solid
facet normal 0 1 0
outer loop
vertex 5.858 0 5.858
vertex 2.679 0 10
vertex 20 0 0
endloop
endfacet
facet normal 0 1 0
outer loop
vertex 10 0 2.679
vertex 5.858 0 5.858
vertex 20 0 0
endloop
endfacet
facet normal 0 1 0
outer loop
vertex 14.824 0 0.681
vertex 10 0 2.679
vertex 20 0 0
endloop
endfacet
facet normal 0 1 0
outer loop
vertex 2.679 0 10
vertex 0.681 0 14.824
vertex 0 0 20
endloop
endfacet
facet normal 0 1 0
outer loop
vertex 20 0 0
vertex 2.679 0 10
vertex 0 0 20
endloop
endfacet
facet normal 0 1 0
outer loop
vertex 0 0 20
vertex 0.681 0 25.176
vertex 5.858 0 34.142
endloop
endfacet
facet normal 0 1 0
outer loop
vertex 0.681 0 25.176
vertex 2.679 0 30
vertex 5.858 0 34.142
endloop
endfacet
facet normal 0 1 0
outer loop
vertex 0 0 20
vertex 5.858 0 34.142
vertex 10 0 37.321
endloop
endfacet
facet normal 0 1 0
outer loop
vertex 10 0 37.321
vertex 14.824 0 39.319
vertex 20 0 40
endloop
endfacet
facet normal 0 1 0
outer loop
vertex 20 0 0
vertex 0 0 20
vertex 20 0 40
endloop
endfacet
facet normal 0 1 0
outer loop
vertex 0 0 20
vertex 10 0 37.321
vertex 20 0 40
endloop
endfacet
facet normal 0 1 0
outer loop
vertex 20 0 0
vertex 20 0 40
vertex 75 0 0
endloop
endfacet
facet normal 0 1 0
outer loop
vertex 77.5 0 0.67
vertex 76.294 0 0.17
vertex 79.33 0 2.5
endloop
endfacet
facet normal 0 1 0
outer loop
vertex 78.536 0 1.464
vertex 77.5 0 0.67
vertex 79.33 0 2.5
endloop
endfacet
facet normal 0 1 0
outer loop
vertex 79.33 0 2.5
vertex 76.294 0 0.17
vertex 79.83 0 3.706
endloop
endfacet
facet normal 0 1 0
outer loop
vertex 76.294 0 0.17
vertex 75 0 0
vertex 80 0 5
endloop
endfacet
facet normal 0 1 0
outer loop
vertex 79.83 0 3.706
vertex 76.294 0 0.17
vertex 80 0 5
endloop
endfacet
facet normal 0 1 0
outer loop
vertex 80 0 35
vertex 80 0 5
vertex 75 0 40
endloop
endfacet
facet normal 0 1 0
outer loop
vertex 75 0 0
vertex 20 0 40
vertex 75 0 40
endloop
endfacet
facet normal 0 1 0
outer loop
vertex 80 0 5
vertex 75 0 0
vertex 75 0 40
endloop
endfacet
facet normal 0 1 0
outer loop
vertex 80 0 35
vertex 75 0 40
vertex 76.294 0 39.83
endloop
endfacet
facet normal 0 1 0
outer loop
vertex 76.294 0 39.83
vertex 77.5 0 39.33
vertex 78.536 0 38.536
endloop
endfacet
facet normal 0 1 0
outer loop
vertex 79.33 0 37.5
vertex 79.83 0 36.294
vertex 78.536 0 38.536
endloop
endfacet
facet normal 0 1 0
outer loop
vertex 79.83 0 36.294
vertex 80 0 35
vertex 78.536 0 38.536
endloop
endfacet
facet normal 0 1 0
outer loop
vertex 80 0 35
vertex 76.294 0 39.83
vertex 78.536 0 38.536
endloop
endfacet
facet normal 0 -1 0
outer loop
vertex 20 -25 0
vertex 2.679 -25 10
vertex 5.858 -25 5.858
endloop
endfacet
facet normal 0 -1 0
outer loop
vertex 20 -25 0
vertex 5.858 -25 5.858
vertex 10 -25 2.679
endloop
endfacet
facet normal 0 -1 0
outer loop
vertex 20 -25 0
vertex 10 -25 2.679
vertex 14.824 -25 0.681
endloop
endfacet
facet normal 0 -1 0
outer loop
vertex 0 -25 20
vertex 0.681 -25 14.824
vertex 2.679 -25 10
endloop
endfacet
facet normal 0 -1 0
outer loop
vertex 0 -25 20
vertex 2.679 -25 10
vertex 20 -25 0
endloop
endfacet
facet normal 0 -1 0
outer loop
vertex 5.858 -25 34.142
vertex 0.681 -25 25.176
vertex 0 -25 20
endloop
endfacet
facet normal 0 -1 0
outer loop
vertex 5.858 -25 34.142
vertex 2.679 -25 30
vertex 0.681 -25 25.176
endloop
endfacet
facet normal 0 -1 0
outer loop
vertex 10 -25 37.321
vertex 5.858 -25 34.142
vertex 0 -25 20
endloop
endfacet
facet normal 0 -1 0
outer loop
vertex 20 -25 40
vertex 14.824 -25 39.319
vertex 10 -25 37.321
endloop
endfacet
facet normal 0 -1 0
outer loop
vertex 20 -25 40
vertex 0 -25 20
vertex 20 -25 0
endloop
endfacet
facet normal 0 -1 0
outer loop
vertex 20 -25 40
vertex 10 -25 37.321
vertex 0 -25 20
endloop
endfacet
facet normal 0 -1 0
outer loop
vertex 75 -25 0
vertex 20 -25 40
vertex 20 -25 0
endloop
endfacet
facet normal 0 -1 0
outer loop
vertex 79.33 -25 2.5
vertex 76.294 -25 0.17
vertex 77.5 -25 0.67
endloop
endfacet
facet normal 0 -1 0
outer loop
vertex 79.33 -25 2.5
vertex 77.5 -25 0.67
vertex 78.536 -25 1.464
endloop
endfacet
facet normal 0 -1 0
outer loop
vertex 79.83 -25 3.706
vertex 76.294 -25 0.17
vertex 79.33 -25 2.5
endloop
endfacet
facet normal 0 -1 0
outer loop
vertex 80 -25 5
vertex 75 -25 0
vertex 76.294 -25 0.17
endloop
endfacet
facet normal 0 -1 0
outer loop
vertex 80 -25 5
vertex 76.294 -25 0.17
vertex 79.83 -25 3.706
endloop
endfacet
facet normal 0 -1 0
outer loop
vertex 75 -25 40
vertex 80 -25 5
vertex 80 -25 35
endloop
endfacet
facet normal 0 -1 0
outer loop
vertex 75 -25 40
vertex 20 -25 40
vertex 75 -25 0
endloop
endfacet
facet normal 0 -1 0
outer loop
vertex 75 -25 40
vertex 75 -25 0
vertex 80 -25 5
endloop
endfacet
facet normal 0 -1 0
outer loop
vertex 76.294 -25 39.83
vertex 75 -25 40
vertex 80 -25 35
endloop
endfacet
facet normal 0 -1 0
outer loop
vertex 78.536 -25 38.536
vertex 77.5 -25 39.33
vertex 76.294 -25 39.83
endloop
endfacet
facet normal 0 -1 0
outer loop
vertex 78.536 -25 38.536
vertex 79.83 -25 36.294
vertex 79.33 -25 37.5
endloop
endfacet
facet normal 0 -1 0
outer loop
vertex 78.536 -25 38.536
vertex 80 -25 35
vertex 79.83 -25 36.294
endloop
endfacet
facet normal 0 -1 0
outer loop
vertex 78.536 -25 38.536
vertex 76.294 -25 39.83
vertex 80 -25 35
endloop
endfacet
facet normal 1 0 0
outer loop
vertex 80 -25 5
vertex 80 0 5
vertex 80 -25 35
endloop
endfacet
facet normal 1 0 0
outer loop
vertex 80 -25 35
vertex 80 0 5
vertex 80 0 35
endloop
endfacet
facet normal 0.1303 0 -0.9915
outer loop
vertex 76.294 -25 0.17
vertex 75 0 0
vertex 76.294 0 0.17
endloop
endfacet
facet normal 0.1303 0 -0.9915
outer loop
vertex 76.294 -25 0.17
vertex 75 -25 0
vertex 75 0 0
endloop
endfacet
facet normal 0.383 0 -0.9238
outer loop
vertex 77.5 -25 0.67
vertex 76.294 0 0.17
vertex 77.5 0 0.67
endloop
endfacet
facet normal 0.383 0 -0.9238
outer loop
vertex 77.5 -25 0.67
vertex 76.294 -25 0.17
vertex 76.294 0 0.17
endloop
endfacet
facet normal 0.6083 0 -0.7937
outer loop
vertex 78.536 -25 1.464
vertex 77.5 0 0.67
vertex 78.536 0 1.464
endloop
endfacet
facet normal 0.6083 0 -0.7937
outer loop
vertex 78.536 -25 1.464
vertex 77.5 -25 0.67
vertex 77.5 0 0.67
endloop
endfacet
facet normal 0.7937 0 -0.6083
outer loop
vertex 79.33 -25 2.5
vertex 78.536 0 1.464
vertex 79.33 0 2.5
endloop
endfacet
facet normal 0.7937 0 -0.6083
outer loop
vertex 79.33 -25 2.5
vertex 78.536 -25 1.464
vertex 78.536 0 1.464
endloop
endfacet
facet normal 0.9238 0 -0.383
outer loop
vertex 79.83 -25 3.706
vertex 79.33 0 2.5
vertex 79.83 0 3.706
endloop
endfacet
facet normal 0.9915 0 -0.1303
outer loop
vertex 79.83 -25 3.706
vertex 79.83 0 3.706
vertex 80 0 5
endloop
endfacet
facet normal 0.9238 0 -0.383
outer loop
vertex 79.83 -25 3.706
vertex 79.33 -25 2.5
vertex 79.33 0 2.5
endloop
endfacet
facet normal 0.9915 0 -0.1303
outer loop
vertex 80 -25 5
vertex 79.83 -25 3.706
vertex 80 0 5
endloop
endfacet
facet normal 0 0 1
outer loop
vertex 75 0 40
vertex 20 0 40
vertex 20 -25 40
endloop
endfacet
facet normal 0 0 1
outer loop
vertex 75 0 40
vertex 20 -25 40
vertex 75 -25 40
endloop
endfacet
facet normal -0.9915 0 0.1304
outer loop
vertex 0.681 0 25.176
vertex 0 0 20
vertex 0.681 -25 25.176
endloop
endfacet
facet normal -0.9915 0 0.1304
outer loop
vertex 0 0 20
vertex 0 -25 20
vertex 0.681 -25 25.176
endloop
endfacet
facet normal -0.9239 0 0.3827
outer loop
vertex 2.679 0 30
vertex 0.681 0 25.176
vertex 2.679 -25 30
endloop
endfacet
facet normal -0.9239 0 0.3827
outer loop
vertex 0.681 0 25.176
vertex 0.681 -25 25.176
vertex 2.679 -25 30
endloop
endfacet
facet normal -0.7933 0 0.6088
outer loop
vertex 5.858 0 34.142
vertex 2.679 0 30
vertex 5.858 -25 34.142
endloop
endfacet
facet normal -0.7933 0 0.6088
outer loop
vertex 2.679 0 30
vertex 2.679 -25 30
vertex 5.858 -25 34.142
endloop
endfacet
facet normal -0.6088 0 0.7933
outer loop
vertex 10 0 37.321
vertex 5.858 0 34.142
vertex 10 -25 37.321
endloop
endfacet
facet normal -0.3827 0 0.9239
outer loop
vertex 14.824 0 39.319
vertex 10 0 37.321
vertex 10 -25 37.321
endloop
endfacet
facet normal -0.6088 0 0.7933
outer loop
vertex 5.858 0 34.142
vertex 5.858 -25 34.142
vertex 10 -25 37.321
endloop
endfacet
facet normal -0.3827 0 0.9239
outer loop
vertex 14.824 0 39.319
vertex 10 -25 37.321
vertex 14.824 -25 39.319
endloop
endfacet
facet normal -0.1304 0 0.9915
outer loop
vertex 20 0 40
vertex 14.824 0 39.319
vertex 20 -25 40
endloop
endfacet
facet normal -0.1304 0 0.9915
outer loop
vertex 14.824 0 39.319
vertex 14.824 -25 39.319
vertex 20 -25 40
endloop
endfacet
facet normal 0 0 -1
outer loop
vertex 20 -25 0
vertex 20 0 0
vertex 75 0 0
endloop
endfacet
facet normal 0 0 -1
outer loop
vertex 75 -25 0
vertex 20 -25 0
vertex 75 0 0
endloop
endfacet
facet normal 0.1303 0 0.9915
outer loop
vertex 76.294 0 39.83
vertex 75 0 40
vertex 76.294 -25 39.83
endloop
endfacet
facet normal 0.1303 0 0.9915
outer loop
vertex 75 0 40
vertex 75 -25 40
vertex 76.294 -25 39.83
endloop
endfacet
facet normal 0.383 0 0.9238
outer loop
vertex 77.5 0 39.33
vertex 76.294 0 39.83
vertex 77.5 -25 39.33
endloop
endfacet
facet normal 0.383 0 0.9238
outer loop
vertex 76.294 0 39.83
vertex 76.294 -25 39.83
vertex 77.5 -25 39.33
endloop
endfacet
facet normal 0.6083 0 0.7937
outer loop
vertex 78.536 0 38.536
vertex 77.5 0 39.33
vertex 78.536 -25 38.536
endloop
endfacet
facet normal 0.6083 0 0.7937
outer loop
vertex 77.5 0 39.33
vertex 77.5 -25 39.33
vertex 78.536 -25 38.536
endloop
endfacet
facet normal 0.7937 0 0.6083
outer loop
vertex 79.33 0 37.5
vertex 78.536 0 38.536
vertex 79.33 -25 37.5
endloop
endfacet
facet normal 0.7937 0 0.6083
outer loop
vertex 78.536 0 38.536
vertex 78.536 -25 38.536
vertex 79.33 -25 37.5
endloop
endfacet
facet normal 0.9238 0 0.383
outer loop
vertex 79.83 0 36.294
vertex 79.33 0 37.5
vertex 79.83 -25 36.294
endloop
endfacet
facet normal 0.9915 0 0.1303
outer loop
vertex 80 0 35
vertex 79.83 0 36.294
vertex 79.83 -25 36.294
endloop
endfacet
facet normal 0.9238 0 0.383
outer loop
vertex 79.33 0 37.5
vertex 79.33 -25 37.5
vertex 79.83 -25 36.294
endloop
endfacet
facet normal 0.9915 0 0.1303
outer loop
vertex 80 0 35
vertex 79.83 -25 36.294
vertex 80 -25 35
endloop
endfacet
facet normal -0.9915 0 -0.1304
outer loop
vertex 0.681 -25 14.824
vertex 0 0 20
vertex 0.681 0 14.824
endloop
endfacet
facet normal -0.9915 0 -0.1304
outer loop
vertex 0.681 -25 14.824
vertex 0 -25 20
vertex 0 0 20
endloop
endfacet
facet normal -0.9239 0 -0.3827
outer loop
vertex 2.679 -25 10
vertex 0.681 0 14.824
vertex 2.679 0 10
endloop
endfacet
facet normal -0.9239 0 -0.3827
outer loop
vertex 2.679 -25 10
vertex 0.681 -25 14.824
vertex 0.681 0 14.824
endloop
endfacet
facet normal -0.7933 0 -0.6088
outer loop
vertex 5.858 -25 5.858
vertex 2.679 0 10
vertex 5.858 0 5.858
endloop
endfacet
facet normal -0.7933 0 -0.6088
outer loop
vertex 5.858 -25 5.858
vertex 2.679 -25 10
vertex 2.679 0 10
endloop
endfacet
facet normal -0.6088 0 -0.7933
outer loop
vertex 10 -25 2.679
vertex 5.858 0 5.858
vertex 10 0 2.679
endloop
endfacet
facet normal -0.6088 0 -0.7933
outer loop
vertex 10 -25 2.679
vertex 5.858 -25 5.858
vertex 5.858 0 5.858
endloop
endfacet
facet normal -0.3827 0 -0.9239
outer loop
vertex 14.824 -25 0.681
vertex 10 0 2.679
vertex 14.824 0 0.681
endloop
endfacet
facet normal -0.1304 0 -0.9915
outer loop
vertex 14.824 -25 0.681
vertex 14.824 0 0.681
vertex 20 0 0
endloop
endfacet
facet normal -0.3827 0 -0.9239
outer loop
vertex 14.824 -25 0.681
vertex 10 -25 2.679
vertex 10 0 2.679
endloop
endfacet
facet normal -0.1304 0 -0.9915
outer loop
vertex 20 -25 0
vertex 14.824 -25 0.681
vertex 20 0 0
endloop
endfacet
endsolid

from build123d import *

# Parameters (mm, degrees)
F0_W     = 80
F0_H     = 40
F1_DEPTH = 25
F2_R     = 20
F3_R     = 19.99999
F4_R     = 5


# Not quite as in the source:
# - a fillet or chamfer is up to 0.001 mm smaller than in the source, because OpenCascade refuses the exact size


with BuildPart() as f1:
    # F0 (on Front) → F1 (new body)
    with BuildSketch(Plane.XZ):
        with Locations((40, 20)):
            Rectangle(F0_W, F0_H)
    extrude(amount=F1_DEPTH)

    # F2
    f2_edges = [f1.edges().sort_by_distance(p)[0] for p in [
        (0, -12.5, 40),
    ]]
    fillet(f2_edges, radius=F2_R)

    # F3 (radius 20 in the source; OpenCascade refuses exactly that, so slightly less here)
    f3_edges = [f1.edges().sort_by_distance(p)[0] for p in [
        (0, -12.5, 0),
    ]]
    fillet(f3_edges, radius=F3_R)

    # F4
    f4_edges = [f1.edges().sort_by_distance(p)[0] for p in [
        (80, -12.5, 40),
        (80, -12.5, 0),
    ]]
    fillet(f4_edges, radius=F4_R)


solid = f1.part
